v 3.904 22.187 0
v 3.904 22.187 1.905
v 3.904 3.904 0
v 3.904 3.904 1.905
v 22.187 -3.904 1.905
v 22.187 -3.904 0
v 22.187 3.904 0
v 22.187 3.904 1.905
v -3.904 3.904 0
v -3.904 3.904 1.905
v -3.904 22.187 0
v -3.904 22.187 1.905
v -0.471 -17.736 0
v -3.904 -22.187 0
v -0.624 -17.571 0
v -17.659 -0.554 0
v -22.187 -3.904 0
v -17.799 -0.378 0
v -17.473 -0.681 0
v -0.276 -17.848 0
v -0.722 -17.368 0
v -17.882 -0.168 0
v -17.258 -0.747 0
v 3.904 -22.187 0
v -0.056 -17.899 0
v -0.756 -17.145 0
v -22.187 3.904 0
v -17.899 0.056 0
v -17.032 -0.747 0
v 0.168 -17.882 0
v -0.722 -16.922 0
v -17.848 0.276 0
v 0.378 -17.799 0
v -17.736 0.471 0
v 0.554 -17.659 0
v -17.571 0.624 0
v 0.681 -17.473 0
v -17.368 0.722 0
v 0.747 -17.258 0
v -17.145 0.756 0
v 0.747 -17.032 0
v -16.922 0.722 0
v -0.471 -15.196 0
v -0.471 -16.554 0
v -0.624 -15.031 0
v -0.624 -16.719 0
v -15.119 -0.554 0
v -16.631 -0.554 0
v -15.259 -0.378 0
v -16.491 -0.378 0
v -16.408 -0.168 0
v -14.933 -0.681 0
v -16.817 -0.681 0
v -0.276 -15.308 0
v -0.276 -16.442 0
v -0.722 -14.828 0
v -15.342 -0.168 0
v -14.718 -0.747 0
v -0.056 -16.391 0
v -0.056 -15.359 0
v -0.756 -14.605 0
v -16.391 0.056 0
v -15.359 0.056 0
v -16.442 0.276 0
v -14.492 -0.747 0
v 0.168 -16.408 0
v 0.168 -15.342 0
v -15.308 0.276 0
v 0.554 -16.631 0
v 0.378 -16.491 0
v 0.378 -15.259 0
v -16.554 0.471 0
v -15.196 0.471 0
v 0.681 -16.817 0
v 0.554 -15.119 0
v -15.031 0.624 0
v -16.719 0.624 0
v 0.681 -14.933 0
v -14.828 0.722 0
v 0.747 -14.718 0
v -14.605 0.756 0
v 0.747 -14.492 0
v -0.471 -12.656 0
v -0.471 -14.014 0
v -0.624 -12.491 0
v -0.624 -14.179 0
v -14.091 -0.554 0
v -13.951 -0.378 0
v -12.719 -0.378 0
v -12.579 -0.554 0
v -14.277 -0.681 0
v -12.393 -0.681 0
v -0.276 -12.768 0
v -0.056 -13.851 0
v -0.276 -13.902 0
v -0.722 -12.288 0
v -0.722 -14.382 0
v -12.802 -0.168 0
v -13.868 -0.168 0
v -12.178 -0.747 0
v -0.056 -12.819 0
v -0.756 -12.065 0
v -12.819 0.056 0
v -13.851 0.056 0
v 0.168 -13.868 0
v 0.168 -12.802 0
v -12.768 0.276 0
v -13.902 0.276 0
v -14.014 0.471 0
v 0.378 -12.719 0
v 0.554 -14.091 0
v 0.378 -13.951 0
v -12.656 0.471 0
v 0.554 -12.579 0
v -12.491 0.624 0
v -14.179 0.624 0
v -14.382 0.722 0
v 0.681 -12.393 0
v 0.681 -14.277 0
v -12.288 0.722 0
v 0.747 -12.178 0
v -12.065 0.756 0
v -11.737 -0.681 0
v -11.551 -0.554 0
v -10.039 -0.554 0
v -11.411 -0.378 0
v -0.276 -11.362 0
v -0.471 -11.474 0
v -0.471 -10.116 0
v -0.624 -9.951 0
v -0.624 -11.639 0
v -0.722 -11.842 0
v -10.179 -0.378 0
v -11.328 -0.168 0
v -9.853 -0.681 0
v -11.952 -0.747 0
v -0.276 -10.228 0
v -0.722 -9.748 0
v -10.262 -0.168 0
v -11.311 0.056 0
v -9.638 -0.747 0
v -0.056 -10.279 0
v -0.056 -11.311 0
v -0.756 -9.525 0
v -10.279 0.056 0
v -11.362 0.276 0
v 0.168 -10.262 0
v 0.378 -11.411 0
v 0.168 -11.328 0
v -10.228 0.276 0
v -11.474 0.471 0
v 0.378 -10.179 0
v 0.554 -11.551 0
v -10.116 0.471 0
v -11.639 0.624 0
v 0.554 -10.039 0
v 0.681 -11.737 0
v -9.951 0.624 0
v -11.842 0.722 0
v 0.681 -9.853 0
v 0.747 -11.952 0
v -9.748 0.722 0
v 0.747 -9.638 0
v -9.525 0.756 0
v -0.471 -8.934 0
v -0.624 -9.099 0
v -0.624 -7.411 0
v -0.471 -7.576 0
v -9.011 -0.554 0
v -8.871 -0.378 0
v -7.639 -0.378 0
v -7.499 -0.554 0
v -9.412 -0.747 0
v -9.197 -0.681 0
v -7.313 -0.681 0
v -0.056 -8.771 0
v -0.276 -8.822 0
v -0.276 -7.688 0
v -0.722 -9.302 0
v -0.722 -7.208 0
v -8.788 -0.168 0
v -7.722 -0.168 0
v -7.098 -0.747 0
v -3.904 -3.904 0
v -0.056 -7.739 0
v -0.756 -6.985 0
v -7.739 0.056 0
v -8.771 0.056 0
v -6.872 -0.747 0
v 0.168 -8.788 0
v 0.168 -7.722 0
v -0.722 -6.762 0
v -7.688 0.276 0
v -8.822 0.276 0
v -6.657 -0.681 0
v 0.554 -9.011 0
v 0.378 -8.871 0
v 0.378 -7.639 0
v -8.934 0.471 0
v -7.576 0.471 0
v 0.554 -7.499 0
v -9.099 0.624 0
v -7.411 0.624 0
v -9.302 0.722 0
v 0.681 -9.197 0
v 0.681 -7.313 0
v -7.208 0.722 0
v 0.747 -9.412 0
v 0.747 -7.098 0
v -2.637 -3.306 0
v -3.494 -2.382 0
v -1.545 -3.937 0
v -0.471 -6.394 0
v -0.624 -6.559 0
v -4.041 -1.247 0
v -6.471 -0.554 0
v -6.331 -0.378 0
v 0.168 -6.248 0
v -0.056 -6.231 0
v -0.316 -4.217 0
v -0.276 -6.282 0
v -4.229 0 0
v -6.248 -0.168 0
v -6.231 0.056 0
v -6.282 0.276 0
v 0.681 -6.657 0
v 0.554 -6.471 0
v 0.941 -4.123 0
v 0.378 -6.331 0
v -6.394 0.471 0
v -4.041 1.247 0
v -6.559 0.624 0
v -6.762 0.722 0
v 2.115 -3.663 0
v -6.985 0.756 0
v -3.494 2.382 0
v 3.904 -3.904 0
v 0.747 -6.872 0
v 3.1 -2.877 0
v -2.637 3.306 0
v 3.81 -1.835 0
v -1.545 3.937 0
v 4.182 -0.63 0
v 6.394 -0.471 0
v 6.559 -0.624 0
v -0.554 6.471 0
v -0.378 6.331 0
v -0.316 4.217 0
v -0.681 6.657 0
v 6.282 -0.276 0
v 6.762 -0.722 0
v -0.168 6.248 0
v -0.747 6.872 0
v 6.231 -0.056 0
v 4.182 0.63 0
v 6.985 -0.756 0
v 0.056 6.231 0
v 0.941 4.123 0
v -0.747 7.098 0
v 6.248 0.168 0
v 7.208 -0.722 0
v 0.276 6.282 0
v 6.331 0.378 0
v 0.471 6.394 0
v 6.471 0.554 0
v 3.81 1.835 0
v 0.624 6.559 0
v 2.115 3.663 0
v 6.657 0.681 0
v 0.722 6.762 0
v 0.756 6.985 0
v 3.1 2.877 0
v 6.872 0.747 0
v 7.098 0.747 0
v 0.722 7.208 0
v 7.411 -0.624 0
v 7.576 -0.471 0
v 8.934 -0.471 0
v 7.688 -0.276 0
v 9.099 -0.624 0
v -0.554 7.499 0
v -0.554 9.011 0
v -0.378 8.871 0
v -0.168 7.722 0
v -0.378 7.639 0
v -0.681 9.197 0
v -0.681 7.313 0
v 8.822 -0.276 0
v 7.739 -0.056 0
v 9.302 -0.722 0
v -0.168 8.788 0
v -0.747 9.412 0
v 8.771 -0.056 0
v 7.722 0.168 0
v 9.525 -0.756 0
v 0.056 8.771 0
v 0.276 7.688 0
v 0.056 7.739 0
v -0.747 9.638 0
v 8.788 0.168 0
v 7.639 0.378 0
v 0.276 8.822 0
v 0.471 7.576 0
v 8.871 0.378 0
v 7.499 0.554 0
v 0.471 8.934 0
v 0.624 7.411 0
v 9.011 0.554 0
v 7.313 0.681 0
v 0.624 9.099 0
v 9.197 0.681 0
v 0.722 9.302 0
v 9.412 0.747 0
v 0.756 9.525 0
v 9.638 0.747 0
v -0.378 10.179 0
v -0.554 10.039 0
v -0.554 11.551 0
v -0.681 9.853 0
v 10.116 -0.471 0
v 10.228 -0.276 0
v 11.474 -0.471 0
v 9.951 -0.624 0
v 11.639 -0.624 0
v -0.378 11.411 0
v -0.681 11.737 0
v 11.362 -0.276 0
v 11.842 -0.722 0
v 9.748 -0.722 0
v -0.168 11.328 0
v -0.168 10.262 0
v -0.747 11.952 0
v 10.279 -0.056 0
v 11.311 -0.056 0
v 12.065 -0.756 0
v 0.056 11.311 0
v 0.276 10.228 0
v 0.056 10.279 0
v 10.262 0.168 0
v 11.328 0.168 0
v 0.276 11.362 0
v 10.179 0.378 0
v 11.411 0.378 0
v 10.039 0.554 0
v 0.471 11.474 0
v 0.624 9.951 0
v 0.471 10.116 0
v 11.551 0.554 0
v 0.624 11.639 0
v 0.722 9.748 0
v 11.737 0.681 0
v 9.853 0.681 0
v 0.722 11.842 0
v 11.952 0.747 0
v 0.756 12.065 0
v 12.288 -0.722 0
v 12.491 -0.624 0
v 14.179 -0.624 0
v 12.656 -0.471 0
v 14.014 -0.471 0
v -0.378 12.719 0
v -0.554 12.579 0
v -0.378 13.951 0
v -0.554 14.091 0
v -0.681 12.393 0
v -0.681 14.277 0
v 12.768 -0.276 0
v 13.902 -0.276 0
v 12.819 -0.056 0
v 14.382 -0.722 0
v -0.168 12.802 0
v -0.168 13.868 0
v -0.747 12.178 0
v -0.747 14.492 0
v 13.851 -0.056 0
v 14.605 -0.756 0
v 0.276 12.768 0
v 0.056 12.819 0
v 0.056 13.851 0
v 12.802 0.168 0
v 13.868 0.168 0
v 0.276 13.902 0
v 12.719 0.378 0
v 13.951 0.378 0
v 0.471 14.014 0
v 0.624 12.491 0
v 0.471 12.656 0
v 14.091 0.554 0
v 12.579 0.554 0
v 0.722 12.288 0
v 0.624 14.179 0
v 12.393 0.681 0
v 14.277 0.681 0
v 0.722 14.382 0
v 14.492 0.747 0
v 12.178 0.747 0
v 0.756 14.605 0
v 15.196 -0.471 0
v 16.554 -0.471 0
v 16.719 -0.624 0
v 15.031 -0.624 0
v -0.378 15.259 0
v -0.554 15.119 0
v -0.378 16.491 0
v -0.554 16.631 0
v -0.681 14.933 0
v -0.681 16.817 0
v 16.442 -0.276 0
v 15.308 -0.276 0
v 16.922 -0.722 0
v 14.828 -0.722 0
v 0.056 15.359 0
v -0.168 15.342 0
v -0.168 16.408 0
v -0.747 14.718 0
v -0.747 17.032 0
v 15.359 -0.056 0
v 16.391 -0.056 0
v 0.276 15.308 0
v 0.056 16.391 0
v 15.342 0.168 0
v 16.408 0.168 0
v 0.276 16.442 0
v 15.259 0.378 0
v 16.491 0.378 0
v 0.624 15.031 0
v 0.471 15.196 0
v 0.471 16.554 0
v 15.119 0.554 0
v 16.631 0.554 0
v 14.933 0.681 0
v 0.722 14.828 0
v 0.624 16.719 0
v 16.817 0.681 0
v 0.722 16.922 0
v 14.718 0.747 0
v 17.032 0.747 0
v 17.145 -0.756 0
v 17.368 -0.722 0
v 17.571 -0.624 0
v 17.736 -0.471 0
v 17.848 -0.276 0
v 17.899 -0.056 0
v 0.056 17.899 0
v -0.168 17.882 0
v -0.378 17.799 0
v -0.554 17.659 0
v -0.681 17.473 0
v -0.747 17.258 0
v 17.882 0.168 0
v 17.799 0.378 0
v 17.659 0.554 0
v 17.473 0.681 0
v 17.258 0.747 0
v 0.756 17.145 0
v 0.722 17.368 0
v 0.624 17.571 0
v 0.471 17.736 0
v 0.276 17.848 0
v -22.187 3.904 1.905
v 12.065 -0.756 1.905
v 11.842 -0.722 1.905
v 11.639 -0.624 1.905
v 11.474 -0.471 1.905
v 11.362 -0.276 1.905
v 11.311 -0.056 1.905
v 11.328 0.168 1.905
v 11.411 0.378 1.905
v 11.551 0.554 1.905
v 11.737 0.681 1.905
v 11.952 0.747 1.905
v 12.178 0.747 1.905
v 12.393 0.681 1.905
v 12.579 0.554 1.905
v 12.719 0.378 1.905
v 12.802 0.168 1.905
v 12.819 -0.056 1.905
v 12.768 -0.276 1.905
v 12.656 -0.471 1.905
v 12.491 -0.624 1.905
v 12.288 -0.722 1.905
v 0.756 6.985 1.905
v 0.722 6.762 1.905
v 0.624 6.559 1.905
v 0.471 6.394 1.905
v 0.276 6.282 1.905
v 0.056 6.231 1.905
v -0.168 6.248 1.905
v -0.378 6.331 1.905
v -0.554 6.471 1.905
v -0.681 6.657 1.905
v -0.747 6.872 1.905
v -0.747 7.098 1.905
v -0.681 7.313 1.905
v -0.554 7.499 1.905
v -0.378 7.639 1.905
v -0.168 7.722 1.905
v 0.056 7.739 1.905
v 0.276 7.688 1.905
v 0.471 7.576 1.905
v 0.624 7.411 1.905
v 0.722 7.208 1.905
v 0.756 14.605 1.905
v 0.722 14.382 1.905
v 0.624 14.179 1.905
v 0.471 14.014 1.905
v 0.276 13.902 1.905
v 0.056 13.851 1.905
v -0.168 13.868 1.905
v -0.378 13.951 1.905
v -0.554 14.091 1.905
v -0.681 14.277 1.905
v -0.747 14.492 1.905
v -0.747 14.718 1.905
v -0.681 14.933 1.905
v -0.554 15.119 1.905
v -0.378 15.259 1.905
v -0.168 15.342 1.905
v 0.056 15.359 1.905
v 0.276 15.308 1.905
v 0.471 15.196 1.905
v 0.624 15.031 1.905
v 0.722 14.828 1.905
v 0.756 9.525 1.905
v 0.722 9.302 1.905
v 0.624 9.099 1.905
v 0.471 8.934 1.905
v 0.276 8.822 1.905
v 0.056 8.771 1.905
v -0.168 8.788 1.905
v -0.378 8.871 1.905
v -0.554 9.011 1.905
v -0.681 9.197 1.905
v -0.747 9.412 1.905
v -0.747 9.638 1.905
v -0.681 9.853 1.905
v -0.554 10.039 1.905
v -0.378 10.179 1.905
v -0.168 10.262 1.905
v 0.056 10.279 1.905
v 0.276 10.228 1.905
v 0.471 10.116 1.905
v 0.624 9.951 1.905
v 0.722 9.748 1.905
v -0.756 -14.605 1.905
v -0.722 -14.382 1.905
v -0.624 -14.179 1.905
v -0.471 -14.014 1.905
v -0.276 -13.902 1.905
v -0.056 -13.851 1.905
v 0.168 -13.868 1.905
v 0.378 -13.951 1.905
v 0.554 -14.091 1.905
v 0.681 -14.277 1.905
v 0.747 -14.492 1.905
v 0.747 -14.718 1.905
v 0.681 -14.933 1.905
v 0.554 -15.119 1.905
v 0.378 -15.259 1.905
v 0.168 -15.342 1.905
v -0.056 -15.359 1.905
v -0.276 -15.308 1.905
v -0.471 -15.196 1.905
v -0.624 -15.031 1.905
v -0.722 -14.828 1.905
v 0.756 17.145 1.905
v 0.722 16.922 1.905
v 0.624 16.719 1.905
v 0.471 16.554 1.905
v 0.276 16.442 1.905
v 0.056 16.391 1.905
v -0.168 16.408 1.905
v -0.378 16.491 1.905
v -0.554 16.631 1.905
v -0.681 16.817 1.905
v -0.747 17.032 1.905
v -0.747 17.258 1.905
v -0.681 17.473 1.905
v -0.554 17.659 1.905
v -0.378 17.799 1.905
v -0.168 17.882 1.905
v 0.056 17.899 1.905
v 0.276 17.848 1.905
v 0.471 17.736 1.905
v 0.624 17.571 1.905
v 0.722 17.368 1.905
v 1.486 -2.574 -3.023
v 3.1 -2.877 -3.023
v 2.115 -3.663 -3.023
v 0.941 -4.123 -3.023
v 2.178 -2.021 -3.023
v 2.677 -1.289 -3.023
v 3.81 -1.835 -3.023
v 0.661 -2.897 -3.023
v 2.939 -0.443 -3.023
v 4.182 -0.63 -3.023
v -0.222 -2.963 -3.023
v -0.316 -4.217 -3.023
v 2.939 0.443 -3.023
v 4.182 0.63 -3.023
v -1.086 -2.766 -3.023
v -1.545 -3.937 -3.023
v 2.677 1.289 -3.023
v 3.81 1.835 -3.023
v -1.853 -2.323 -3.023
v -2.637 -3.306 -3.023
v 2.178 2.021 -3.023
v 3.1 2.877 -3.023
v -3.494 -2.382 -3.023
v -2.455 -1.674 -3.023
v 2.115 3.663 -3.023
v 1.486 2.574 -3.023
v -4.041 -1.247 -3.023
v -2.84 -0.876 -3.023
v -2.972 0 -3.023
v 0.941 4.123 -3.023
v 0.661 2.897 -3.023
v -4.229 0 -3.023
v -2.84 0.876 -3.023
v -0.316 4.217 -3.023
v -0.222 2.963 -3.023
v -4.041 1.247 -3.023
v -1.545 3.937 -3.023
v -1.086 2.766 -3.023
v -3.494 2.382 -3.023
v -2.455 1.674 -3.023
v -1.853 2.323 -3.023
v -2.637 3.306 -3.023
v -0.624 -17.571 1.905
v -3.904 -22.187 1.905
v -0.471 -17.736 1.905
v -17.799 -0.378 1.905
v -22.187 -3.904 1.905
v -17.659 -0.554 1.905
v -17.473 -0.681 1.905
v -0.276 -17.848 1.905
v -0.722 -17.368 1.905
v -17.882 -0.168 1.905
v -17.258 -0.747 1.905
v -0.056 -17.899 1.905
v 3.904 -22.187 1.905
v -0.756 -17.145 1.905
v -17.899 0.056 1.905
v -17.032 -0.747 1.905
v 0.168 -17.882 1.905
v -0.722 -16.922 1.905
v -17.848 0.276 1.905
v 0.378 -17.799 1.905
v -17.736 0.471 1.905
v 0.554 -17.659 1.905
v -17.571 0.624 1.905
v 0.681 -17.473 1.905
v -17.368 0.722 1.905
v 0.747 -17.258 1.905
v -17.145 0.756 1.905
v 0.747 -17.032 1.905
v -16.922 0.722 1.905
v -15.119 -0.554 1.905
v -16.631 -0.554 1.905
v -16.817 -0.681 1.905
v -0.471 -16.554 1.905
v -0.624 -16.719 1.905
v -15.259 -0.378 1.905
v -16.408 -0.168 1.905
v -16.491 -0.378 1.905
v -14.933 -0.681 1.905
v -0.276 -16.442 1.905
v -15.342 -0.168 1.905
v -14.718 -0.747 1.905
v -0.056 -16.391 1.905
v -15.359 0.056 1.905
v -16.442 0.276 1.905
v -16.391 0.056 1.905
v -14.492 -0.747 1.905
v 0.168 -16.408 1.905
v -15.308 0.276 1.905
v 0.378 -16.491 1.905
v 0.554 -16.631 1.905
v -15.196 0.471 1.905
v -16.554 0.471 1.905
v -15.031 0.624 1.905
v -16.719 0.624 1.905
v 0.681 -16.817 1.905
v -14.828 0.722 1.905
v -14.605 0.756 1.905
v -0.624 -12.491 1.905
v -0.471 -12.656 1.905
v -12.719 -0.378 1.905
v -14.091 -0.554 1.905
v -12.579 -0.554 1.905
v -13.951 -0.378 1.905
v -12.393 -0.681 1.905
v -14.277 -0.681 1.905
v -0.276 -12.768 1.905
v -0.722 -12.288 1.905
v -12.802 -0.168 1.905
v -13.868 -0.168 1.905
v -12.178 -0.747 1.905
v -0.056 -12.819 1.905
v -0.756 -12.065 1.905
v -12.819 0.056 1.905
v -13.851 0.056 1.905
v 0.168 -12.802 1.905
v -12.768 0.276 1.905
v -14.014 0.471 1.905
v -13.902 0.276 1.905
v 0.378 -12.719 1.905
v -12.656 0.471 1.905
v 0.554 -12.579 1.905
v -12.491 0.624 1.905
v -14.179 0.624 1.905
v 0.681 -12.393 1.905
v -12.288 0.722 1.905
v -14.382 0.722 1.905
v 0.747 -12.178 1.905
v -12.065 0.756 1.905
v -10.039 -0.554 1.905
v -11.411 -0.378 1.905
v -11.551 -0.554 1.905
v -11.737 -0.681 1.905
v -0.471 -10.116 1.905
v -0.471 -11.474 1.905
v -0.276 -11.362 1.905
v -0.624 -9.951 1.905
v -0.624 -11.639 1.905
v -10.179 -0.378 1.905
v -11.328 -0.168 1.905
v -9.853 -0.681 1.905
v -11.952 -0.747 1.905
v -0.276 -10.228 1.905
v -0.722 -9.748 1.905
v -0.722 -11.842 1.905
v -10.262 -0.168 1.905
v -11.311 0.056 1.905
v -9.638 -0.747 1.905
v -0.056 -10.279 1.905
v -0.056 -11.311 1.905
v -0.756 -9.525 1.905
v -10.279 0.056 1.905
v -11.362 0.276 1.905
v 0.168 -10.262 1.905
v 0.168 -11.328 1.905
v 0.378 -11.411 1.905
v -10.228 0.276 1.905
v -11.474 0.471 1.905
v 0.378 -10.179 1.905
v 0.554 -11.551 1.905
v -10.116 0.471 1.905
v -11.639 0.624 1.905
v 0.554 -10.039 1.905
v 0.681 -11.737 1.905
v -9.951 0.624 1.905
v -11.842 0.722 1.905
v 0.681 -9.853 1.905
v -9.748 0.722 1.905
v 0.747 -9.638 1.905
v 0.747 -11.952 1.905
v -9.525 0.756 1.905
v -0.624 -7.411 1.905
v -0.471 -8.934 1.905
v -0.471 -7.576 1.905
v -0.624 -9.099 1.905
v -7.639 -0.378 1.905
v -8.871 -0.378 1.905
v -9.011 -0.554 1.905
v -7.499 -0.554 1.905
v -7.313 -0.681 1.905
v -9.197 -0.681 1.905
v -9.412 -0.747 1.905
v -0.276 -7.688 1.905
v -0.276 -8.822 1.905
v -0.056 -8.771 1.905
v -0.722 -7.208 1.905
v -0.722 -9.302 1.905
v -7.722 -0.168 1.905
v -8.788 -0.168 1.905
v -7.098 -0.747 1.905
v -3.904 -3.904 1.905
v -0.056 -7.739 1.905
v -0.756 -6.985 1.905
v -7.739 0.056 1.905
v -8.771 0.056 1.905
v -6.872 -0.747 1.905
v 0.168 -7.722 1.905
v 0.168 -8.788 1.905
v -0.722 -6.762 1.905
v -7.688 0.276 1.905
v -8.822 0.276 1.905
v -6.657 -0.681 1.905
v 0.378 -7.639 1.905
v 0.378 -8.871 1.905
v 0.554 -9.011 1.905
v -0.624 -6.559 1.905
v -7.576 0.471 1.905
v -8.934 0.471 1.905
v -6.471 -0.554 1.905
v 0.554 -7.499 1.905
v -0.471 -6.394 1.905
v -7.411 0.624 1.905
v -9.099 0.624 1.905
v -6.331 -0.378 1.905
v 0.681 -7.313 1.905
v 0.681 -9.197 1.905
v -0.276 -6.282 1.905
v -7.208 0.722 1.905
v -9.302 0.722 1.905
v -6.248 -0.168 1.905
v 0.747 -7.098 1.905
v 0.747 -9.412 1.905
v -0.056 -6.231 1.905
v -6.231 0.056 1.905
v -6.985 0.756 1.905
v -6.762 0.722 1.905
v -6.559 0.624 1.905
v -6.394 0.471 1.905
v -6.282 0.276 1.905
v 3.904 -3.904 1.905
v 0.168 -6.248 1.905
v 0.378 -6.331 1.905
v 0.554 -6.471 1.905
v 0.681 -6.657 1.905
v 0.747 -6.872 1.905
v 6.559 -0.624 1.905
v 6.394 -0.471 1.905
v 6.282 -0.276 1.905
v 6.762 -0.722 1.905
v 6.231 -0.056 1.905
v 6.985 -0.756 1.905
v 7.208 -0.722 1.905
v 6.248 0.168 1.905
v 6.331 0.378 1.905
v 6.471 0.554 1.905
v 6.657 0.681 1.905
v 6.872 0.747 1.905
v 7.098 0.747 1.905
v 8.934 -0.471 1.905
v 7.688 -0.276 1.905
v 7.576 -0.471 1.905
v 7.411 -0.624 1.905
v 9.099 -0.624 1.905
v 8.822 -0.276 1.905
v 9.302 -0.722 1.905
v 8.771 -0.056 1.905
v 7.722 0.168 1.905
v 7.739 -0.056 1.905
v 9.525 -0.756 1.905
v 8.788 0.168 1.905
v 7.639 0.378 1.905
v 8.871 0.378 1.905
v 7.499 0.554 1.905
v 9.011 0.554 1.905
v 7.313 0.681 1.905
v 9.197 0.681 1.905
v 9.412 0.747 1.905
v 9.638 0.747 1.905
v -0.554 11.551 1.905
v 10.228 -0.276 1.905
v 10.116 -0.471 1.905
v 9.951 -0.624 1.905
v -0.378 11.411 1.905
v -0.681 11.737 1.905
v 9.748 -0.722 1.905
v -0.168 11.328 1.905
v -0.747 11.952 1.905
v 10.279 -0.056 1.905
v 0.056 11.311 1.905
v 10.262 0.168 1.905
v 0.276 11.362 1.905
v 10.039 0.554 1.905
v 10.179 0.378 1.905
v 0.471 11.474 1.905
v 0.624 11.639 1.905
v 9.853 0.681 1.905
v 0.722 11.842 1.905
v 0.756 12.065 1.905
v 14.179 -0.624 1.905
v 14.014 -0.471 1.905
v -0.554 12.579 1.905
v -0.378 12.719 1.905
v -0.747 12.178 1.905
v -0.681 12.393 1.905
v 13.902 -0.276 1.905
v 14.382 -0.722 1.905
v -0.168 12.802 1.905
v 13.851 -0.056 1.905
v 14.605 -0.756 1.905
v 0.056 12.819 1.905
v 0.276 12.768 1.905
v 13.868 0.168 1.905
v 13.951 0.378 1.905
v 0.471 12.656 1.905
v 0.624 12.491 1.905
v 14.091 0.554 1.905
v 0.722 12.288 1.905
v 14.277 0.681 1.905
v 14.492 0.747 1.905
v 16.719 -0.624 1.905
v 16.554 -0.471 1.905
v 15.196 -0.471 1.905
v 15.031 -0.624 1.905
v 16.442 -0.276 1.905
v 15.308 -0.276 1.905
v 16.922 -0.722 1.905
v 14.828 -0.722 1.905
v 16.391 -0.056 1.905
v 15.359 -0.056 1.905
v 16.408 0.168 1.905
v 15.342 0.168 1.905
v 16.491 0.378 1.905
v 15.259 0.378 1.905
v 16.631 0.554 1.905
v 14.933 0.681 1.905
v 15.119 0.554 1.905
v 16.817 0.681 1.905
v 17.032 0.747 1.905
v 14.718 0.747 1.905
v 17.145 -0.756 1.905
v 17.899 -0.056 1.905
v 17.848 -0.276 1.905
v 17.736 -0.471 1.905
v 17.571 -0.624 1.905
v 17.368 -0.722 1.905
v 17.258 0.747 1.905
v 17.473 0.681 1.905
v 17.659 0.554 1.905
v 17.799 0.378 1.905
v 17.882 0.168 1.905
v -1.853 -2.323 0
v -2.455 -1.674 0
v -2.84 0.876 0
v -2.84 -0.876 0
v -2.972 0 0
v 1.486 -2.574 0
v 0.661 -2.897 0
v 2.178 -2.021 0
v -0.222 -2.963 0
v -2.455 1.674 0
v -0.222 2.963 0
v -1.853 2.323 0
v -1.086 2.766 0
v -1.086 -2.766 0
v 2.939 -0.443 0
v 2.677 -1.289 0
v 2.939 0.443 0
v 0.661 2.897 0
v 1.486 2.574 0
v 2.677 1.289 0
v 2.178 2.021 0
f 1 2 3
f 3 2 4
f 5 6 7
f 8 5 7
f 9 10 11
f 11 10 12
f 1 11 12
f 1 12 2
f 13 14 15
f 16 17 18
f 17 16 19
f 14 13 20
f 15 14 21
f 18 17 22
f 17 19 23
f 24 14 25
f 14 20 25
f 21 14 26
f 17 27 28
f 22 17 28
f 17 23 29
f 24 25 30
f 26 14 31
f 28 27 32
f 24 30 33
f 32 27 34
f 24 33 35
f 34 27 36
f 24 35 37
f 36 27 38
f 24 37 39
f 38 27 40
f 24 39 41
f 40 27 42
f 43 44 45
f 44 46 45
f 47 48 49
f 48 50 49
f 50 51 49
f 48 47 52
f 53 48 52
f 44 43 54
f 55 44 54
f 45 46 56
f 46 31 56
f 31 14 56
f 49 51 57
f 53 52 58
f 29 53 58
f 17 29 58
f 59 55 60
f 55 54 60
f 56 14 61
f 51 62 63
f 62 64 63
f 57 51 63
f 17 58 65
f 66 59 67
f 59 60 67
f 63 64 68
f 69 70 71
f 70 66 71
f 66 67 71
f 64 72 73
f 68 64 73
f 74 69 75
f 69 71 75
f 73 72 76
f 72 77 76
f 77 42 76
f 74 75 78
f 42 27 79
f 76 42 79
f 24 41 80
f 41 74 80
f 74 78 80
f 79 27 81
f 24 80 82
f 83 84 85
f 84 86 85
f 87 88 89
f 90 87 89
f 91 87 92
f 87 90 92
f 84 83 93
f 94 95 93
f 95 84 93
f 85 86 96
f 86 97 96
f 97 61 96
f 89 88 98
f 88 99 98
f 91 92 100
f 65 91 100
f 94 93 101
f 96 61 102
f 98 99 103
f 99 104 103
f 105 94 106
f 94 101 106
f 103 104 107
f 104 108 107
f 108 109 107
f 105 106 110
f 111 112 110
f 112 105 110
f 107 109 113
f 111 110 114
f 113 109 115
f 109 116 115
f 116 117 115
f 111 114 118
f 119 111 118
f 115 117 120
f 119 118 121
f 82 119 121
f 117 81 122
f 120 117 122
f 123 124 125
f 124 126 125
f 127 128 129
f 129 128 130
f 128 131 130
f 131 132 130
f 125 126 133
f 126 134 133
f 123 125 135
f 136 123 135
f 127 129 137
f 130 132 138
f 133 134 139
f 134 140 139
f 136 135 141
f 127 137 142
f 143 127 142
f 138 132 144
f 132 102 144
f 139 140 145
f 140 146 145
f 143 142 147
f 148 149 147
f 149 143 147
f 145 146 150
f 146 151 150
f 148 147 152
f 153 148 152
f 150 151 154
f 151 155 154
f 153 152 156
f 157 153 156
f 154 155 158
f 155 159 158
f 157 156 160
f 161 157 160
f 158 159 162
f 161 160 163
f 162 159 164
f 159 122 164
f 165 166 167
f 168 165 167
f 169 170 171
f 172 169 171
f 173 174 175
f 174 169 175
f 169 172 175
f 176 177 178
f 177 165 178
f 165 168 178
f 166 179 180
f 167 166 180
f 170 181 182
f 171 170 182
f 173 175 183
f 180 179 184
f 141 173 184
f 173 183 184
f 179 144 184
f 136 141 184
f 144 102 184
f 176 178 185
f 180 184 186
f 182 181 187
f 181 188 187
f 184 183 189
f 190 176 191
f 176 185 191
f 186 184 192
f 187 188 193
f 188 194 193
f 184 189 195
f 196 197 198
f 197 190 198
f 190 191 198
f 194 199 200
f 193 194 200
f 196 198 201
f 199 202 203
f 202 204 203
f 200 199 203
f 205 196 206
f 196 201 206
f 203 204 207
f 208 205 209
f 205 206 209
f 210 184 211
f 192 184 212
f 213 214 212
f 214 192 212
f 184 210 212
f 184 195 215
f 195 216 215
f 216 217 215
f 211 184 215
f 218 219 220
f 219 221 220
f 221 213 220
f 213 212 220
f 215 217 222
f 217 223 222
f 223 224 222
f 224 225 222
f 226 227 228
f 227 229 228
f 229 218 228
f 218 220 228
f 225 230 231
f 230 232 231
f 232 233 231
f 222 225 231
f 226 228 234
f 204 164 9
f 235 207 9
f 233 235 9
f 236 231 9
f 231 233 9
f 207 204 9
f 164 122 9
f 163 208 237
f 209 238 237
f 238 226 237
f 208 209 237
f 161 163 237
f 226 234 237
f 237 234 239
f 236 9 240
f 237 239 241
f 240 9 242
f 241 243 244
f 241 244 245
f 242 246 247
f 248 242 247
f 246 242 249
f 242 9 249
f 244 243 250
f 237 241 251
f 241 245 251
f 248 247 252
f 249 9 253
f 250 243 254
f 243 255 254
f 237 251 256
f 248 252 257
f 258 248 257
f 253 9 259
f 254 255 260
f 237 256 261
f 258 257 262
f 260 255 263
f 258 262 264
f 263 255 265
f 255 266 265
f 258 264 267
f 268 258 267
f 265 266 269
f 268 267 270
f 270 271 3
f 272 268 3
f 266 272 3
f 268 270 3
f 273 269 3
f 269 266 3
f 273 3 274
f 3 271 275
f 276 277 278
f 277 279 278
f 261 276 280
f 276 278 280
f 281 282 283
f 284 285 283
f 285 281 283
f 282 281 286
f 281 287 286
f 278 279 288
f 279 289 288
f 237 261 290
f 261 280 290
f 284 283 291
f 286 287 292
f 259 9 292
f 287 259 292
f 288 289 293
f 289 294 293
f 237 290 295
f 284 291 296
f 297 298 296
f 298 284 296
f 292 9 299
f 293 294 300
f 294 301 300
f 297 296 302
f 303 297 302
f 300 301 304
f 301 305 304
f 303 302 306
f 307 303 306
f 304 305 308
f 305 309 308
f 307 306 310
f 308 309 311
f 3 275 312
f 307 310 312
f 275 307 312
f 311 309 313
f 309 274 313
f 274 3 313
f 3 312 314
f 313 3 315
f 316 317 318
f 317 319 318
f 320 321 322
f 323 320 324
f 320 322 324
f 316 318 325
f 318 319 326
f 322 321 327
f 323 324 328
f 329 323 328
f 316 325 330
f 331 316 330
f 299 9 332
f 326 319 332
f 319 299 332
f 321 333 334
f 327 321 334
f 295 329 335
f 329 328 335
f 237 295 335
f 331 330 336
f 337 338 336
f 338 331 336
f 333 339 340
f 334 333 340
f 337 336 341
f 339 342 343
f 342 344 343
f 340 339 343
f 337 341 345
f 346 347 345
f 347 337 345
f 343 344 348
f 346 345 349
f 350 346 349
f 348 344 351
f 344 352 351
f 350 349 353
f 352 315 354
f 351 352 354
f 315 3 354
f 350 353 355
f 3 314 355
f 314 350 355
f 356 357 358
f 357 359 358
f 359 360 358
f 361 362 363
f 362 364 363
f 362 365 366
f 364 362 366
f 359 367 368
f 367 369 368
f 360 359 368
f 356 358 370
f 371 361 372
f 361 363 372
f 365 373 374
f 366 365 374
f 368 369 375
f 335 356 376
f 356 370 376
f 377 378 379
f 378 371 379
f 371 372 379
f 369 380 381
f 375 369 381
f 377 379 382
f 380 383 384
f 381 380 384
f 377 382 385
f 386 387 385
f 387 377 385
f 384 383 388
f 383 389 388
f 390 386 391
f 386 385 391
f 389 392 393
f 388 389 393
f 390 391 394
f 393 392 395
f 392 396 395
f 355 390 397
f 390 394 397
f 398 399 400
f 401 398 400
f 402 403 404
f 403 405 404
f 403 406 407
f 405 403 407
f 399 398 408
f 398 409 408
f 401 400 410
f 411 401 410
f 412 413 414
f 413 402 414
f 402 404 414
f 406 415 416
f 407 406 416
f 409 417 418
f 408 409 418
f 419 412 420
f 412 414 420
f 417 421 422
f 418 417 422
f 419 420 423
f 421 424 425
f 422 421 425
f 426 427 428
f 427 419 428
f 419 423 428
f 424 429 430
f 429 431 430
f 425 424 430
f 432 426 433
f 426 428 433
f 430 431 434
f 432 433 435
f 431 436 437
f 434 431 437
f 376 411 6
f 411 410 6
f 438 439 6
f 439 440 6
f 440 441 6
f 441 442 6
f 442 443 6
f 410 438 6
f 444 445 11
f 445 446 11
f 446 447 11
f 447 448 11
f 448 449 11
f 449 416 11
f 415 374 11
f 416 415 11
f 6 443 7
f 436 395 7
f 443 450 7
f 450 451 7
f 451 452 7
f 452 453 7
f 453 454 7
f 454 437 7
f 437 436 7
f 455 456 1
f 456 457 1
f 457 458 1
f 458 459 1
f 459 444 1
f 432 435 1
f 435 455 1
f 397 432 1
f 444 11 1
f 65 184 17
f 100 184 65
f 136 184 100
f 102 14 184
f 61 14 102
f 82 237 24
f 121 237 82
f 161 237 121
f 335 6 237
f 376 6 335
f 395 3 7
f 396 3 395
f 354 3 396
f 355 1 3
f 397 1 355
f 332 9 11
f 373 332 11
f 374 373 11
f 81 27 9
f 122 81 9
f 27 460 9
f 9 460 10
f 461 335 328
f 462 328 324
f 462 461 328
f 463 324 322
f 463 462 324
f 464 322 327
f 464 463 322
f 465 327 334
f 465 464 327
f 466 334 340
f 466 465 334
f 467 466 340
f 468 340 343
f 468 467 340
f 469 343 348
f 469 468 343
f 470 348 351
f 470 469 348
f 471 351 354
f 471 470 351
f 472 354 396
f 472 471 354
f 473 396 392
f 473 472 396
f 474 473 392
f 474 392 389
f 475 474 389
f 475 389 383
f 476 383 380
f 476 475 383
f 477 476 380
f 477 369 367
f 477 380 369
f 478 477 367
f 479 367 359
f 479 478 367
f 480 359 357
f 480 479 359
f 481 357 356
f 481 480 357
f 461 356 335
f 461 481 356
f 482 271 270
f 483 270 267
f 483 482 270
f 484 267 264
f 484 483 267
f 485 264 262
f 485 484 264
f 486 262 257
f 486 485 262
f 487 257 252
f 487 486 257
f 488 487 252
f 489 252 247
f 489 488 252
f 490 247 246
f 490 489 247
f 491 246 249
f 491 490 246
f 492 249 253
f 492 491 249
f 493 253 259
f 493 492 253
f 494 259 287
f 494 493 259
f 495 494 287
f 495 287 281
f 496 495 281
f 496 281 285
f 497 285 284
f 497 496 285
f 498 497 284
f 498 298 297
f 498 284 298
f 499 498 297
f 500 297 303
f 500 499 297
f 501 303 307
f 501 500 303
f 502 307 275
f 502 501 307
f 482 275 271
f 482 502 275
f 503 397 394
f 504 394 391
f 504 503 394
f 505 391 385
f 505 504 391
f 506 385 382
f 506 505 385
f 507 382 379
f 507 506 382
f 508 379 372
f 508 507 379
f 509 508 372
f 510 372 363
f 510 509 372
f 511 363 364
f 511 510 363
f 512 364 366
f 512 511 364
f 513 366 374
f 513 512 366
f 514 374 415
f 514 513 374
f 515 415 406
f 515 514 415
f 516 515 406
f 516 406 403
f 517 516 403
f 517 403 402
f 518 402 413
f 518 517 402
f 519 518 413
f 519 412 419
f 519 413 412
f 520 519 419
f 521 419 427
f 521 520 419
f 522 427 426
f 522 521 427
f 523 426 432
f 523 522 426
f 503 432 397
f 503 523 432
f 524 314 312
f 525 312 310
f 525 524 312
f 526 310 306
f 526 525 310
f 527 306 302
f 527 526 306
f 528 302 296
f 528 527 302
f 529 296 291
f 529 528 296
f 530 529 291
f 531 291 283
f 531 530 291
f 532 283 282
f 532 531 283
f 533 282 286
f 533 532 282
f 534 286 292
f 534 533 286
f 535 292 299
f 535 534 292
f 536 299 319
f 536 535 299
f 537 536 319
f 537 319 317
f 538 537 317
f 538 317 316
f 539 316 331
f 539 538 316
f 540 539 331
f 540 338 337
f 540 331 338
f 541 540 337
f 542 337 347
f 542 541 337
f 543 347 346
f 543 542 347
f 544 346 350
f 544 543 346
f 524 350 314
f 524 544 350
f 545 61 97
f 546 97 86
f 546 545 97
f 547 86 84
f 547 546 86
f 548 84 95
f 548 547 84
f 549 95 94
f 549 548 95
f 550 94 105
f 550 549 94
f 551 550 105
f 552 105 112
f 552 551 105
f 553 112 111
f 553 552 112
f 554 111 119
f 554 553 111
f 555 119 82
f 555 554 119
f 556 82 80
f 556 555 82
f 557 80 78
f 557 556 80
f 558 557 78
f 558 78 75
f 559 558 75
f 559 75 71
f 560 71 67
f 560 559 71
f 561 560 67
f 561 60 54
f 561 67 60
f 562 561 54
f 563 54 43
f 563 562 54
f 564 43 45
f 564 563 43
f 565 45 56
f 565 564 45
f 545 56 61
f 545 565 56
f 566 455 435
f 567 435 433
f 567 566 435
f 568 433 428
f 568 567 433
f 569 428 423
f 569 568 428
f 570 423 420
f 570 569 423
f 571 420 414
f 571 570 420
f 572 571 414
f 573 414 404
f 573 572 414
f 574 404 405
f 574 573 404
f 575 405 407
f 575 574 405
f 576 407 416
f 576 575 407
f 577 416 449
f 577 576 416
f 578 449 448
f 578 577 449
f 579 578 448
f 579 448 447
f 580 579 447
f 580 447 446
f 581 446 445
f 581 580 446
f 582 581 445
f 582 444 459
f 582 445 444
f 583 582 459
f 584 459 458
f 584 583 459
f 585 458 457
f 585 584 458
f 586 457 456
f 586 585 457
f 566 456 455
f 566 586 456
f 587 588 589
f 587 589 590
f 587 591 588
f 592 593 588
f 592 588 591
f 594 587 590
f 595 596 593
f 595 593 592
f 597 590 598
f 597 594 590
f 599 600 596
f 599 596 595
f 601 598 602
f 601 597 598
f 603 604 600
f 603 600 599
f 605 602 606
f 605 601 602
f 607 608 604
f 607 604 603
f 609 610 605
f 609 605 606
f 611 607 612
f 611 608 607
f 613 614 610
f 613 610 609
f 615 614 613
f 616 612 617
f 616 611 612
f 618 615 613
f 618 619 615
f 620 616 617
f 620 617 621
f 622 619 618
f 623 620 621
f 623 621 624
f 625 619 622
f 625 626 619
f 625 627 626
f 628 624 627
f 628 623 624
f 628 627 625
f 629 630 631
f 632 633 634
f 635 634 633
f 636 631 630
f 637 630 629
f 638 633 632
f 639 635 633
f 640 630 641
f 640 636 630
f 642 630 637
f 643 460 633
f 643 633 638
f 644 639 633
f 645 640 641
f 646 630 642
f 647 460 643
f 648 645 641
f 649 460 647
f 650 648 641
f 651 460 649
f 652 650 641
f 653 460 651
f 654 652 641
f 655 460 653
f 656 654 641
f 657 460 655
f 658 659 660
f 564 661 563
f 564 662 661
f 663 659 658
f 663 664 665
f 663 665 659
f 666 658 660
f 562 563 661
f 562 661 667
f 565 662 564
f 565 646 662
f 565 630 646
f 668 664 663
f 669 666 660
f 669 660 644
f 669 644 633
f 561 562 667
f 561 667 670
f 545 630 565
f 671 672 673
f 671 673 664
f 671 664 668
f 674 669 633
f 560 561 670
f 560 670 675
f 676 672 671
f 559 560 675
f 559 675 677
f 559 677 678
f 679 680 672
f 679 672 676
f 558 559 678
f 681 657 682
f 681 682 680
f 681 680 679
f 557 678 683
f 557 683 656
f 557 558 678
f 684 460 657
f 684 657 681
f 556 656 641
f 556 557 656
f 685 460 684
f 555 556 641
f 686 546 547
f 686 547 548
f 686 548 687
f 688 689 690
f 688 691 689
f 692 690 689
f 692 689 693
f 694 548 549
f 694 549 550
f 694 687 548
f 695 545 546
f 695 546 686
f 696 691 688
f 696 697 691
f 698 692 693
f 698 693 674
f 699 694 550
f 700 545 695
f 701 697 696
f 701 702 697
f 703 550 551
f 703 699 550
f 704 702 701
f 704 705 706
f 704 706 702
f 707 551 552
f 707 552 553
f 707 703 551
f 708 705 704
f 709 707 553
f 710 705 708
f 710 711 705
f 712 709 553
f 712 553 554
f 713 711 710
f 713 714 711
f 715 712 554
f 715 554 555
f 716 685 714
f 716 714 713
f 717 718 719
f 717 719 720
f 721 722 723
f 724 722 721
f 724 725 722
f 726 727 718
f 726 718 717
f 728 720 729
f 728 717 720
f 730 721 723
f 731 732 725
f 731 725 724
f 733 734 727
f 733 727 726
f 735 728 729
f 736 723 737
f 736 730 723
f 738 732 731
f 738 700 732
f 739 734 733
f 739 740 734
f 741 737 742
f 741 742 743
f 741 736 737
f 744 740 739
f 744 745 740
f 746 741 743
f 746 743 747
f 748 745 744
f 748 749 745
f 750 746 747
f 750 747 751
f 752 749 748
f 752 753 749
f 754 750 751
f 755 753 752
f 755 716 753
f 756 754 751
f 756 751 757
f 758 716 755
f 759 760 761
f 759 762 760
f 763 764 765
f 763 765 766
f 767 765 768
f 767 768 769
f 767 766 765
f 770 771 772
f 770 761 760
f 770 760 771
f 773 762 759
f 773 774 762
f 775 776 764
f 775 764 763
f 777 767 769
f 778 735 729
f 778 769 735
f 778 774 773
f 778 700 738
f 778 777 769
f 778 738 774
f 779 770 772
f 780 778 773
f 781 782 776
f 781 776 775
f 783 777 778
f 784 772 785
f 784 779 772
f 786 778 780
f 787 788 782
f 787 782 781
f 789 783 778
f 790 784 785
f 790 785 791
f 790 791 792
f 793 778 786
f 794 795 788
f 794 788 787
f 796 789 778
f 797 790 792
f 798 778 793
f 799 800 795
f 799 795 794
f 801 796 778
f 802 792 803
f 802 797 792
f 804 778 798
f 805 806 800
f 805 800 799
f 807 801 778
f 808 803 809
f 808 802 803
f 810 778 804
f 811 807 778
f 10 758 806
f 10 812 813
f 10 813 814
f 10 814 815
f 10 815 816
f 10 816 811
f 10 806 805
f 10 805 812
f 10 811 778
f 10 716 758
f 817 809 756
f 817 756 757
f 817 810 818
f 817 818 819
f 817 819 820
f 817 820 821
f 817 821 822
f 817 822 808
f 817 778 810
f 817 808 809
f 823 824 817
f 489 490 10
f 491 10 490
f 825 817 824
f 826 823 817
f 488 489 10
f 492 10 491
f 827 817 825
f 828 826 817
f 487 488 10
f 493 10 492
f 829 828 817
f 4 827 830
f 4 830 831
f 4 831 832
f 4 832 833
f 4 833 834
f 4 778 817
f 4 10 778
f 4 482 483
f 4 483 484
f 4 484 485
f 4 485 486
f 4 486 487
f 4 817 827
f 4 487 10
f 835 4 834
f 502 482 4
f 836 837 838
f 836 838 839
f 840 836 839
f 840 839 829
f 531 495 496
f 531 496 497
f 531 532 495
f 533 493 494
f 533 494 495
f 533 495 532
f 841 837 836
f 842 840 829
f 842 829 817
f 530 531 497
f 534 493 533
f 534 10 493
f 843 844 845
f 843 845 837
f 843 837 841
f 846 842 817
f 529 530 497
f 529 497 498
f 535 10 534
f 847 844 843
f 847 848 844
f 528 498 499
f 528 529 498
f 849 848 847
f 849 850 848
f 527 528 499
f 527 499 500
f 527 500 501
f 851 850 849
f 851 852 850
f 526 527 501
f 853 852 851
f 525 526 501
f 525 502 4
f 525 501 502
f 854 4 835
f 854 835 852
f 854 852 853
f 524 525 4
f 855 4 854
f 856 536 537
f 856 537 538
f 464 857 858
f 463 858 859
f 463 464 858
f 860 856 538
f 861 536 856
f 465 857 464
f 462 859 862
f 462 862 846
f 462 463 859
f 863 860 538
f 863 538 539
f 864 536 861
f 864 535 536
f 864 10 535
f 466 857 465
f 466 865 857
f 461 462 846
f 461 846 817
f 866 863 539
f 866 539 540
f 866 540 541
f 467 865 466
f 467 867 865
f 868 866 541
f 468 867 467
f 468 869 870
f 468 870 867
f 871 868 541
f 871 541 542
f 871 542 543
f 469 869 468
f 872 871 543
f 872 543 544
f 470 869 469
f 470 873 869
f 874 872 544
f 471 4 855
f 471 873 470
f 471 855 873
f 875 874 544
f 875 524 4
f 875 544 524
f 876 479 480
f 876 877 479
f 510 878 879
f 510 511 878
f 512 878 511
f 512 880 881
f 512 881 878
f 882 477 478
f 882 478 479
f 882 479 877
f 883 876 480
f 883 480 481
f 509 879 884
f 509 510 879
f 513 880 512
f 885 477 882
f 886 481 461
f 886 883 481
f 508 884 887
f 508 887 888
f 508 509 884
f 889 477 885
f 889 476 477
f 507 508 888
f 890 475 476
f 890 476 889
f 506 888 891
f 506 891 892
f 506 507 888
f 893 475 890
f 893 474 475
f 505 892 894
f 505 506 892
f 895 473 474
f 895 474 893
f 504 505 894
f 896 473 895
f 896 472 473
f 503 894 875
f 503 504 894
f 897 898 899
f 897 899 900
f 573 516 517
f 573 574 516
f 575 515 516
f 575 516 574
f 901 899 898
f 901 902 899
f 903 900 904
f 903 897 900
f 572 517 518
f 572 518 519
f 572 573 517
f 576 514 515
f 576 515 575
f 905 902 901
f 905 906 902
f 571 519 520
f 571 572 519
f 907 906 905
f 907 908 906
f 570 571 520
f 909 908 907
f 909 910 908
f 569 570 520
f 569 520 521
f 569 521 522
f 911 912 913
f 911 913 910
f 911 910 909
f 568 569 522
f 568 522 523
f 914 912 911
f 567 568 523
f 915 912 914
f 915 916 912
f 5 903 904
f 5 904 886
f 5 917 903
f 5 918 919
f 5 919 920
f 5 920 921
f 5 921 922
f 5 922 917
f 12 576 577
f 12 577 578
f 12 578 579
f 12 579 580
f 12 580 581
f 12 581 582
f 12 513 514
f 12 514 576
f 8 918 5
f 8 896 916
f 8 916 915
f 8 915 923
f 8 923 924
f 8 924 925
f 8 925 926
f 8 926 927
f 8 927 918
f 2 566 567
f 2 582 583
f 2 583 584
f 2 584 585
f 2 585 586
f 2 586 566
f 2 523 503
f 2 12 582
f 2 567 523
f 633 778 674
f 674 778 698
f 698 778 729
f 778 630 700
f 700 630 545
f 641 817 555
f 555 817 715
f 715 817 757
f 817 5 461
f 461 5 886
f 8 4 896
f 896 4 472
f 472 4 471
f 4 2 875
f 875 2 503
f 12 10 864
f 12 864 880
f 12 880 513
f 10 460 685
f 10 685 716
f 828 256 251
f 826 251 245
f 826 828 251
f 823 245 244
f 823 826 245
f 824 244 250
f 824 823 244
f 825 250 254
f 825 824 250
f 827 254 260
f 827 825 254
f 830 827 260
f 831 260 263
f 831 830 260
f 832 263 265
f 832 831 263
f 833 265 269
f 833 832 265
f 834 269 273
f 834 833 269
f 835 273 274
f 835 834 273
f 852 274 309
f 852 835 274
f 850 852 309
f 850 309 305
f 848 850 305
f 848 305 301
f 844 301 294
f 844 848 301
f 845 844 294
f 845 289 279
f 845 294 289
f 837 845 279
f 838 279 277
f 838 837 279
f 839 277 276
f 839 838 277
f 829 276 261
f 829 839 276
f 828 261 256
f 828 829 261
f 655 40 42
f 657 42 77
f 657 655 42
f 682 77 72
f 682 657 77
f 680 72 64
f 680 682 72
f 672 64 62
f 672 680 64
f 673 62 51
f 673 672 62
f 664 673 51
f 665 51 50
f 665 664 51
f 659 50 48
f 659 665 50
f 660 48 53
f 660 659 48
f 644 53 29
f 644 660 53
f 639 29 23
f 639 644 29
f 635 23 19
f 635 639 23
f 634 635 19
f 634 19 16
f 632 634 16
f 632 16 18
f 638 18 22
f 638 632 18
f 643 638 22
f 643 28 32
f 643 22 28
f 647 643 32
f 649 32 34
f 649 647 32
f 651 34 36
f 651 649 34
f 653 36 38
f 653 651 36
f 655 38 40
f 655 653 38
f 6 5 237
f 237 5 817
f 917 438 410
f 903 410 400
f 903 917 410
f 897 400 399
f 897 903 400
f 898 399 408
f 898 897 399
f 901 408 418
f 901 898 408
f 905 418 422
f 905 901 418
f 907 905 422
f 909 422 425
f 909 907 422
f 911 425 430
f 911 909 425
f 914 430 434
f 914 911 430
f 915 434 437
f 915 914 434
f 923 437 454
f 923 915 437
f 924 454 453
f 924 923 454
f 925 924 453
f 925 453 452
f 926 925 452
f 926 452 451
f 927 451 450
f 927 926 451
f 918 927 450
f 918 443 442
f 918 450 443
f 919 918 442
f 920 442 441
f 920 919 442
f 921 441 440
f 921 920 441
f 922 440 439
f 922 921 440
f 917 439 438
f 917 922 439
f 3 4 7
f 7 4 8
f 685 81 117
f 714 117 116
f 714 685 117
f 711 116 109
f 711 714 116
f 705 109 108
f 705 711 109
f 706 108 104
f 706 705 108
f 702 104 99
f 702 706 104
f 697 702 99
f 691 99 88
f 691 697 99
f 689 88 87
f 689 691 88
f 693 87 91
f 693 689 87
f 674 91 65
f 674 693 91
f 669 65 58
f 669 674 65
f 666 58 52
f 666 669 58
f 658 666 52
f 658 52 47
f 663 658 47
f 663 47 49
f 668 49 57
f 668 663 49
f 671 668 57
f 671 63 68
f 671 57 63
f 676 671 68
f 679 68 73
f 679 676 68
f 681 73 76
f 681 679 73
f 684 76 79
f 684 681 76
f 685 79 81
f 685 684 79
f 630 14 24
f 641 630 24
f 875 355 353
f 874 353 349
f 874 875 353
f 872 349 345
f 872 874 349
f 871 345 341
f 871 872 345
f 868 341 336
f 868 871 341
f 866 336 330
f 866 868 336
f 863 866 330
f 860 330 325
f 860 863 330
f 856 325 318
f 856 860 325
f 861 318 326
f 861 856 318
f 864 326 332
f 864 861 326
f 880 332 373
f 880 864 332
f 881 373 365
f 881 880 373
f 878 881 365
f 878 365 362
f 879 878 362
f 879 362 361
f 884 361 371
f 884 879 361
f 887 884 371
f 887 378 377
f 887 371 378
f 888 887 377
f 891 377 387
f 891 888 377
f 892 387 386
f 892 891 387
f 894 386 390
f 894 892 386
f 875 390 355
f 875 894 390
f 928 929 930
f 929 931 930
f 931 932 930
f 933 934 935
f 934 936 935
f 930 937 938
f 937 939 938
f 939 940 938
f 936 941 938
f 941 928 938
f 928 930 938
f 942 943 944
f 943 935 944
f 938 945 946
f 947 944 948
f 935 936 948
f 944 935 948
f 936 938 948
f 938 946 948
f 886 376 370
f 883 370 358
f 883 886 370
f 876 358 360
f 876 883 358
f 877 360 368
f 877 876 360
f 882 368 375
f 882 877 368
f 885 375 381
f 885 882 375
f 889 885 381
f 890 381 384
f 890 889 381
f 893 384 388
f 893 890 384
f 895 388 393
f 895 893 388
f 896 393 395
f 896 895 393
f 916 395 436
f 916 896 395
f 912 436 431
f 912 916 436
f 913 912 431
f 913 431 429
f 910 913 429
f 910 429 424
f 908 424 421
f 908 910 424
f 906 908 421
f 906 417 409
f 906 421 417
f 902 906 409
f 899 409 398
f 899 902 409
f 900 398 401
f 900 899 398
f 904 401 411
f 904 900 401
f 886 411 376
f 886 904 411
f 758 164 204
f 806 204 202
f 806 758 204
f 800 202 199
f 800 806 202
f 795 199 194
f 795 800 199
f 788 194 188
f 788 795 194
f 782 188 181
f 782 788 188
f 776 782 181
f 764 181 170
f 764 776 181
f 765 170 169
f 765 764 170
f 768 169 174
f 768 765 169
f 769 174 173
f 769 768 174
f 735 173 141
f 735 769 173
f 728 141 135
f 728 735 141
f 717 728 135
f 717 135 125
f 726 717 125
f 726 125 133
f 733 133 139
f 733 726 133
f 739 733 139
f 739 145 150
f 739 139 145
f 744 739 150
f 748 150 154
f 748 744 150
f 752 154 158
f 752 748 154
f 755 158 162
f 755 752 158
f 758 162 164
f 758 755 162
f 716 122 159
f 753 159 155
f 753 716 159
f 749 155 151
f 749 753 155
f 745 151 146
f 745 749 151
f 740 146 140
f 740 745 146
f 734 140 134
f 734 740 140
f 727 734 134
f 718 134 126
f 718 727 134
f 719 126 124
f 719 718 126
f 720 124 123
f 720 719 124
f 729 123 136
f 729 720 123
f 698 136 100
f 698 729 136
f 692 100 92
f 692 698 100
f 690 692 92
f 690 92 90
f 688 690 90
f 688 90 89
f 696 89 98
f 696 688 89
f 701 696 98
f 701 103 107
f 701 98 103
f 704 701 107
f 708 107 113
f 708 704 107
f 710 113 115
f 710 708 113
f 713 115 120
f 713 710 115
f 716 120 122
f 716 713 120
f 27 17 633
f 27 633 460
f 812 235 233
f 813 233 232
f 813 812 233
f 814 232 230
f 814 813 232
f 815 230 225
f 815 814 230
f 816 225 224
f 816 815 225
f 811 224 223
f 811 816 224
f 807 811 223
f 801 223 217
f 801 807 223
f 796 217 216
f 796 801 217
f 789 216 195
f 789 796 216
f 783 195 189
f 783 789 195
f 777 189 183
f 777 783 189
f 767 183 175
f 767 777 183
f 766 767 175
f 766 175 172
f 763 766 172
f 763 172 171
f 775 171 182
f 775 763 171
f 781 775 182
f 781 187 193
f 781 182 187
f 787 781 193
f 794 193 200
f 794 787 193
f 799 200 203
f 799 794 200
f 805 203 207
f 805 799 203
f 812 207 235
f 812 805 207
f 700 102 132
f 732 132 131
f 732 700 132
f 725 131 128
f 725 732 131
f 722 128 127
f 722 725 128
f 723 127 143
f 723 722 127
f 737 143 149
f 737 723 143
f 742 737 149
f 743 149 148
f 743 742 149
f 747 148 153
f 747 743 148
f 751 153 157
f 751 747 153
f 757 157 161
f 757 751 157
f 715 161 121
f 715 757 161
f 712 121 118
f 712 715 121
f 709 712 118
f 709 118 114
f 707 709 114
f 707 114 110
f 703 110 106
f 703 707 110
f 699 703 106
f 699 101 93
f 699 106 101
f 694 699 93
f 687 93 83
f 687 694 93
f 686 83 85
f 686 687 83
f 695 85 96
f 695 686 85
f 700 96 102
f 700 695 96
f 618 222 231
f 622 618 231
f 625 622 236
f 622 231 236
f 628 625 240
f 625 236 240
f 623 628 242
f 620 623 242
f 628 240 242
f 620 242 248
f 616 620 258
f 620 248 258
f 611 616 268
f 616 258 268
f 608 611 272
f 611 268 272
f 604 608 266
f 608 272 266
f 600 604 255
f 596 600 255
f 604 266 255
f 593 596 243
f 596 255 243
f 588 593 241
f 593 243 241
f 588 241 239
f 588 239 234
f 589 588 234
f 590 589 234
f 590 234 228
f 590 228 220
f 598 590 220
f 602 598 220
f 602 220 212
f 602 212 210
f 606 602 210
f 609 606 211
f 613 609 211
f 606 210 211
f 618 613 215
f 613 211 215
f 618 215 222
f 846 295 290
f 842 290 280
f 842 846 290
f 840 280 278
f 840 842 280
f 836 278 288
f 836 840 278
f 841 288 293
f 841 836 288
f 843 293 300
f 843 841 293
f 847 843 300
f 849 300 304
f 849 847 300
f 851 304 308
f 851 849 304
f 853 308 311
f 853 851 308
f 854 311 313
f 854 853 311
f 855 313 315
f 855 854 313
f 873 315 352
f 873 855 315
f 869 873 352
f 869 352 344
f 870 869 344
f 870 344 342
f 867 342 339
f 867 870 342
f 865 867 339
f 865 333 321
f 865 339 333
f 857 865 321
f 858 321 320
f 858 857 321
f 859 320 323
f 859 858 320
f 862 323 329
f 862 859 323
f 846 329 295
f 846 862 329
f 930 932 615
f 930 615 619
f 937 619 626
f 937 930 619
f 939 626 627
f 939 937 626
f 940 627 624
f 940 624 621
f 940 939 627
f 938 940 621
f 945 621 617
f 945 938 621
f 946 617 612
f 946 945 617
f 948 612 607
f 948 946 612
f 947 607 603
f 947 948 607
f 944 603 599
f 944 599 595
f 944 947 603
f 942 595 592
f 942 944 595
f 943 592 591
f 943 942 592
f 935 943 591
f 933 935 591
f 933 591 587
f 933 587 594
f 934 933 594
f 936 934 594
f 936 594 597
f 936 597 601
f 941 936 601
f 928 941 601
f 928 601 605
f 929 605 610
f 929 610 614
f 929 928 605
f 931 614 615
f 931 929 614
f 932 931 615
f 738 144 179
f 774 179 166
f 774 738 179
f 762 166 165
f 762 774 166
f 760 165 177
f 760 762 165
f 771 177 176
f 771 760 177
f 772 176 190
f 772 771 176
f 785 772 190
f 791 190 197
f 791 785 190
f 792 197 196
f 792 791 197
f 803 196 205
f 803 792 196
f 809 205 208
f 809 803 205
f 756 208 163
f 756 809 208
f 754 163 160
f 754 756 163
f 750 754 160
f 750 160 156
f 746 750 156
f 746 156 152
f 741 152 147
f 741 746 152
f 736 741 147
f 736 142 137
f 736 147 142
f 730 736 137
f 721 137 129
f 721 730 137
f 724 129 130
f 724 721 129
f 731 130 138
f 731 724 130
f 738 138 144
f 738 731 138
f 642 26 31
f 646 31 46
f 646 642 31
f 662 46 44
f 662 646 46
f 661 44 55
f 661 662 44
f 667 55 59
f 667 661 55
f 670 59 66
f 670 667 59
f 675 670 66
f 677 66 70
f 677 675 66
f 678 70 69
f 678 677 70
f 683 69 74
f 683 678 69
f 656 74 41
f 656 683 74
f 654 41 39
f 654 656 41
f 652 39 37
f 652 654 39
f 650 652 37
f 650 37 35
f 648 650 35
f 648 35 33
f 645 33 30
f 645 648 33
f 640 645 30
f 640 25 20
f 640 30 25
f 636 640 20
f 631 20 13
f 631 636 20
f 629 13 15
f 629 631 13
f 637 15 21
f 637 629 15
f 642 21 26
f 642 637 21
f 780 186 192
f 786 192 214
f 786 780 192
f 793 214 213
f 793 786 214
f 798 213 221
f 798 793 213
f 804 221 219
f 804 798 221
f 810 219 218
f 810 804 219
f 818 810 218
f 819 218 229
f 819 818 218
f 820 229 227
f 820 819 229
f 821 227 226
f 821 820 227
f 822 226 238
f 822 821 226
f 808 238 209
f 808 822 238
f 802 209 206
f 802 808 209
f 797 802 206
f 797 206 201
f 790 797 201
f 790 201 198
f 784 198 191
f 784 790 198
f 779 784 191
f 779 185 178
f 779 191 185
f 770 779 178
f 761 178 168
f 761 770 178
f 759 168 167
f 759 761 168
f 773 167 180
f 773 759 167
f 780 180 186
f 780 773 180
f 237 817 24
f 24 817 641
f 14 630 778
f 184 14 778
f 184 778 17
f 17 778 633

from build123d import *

# Parameters (mm, degrees)
SKETCH1_W         = 44.3738
SKETCH1_H         = 44.3738
EXTRUDE1_DEPTH    = 1.905
SKETCH2_R         = 4.2291
SKETCH2_R_2       = 2.9718
EXTRUDE2_DEPTH    = 3.0226
LPATTERN2_COUNT   = 5
LPATTERN2_PITCH   = 2.54
CIRPATTERN2_COUNT = 4
SKETCH6_W         = 18.282489336
SKETCH6_H         = 18.282489336
EXTRUDE3_DEPTH    = 5.9276
CIRPATTERN3_COUNT = 4


with BuildPart() as part:
    # Sketch1 → Extrude1 (new body)
    with BuildSketch(Plane.XY):
        Rectangle(SKETCH1_W, SKETCH1_H)
    extrude(amount=EXTRUDE1_DEPTH)

    # Sketch2 → Extrude2 (add)
    with BuildSketch(Plane(origin=(0, 0, 0), x_dir=(-1, 0, 0), z_dir=(0, 0, -1))):
        Circle(SKETCH2_R)
        Circle(SKETCH2_R_2, mode=Mode.SUBTRACT)
    extrude(amount=EXTRUDE2_DEPTH)

    # Sketch4 → #53 (0.0595) Diameter Hole1 (revolve, cut)
    with BuildSketch(Plane(origin=(6.985, 0, 1.905), x_dir=(0, -1, 0), z_dir=(1, 0, 0))):
        Polygon((0, 0), (0, 5.534040327), (0.75565, 5.08), (0.75565, 0), align=None)
    f_53_0_0595_diameter_hole1 = revolve(axis=Axis((6.985, 0, 8.255), (0, 0, -1)), mode=Mode.SUBTRACT)

    # LPattern2: #53 (0.0595) Diameter Hole1 ×5
    with Locations(*[(i * LPATTERN2_PITCH, 0, 0) for i in range(1, LPATTERN2_COUNT)]):
        add(f_53_0_0595_diameter_hole1, mode=Mode.SUBTRACT)

    # CirPattern2: #53 (0.0595) Diameter Hole1 ×4 about axis
    cirpattern2_axis = Axis((0, 0, 0), (0, 0, 1))
    for i in range(1, CIRPATTERN2_COUNT):
        add(f_53_0_0595_diameter_hole1.rotate(cirpattern2_axis, i * 360 / CIRPATTERN2_COUNT), mode=Mode.SUBTRACT)

    # CirPattern2 copy 1 sketch → CirPattern2 copy 1 (revolve, cut)
    with BuildSketch(Plane(origin=(0, 9.525, 1.905), x_dir=(1, 0, 0), z_dir=(0, 1, 0))):
        Polygon((0, 0), (0, 5.534040327), (0.75565, 5.08), (0.75565, 0), align=None)
    revolve(axis=Axis((0, 9.525, 8.255), (0, 0, -1)), mode=Mode.SUBTRACT)

    # CirPattern2 copy 2 sketch → CirPattern2 copy 2 (revolve, cut)
    with BuildSketch(Plane(origin=(-9.525, 0, 1.905), x_dir=(0, 1, 0), z_dir=(-1, 0, 0))):
        Polygon((0, 0), (0, 5.534040327), (0.75565, 5.08), (0.75565, 0), align=None)
    revolve(axis=Axis((-9.525, 0, 8.255), (0, 0, -1)), mode=Mode.SUBTRACT)

    # CirPattern2 copy 3 sketch → CirPattern2 copy 3 (revolve, cut)
    with BuildSketch(Plane(origin=(0, -9.525, 1.905), x_dir=(-1, 0, 0), z_dir=(0, -1, 0))):
        Polygon((0, 0), (0, 5.534040327), (0.75565, 5.08), (0.75565, 0), align=None)
    revolve(axis=Axis((0, -9.525, 8.255), (0, 0, -1)), mode=Mode.SUBTRACT)

    # CirPattern2 copy 4 sketch → CirPattern2 copy 4 (revolve, cut)
    with BuildSketch(Plane(origin=(0, 12.065, 1.905), x_dir=(1, 0, 0), z_dir=(0, 1, 0))):
        Polygon((0, 0), (0, 5.534040327), (0.75565, 5.08), (0.75565, 0), align=None)
    revolve(axis=Axis((0, 12.065, 8.255), (0, 0, -1)), mode=Mode.SUBTRACT)

    # CirPattern2 copy 5 sketch → CirPattern2 copy 5 (revolve, cut)
    with BuildSketch(Plane(origin=(-12.065, 0, 1.905), x_dir=(0, 1, 0), z_dir=(-1, 0, 0))):
        Polygon((0, 0), (0, 5.534040327), (0.75565, 5.08), (0.75565, 0), align=None)
    revolve(axis=Axis((-12.065, 0, 8.255), (0, 0, -1)), mode=Mode.SUBTRACT)

    # CirPattern2 copy 6 sketch → CirPattern2 copy 6 (revolve, cut)
    with BuildSketch(Plane(origin=(0, -12.065, 1.905), x_dir=(-1, 0, 0), z_dir=(0, -1, 0))):
        Polygon((0, 0), (0, 5.534040327), (0.75565, 5.08), (0.75565, 0), align=None)
    revolve(axis=Axis((0, -12.065, 8.255), (0, 0, -1)), mode=Mode.SUBTRACT)

    # CirPattern2 copy 7 sketch → CirPattern2 copy 7 (revolve, cut)
    with BuildSketch(Plane(origin=(0, 14.605, 1.905), x_dir=(1, 0, 0), z_dir=(0, 1, 0))):
        Polygon((0, 0), (0, 5.534040327), (0.75565, 5.08), (0.75565, 0), align=None)
    revolve(axis=Axis((0, 14.605, 8.255), (0, 0, -1)), mode=Mode.SUBTRACT)

    # CirPattern2 copy 8 sketch → CirPattern2 copy 8 (revolve, cut)
    with BuildSketch(Plane(origin=(-14.605, 0, 1.905), x_dir=(0, 1, 0), z_dir=(-1, 0, 0))):
        Polygon((0, 0), (0, 5.534040327), (0.75565, 5.08), (0.75565, 0), align=None)
    revolve(axis=Axis((-14.605, 0, 8.255), (0, 0, -1)), mode=Mode.SUBTRACT)

    # CirPattern2 copy 9 sketch → CirPattern2 copy 9 (revolve, cut)
    with BuildSketch(Plane(origin=(0, -14.605, 1.905), x_dir=(-1, 0, 0), z_dir=(0, -1, 0))):
        Polygon((0, 0), (0, 5.534040327), (0.75565, 5.08), (0.75565, 0), align=None)
    revolve(axis=Axis((0, -14.605, 8.255), (0, 0, -1)), mode=Mode.SUBTRACT)

    # CirPattern2 copy 10 sketch → CirPattern2 copy 10 (revolve, cut)
    with BuildSketch(Plane(origin=(0, 17.145, 1.905), x_dir=(1, 0, 0), z_dir=(0, 1, 0))):
        Polygon((0, 0), (0, 5.534040327), (0.75565, 5.08), (0.75565, 0), align=None)
    revolve(axis=Axis((0, 17.145, 8.255), (0, 0, -1)), mode=Mode.SUBTRACT)

    # CirPattern2 copy 11 sketch → CirPattern2 copy 11 (revolve, cut)
    with BuildSketch(Plane(origin=(-17.145, 0, 1.905), x_dir=(0, 1, 0), z_dir=(-1, 0, 0))):
        Polygon((0, 0), (0, 5.534040327), (0.75565, 5.08), (0.75565, 0), align=None)
    revolve(axis=Axis((-17.145, 0, 8.255), (0, 0, -1)), mode=Mode.SUBTRACT)

    # CirPattern2 copy 12 sketch → CirPattern2 copy 12 (revolve, cut)
    with BuildSketch(Plane(origin=(0, -17.145, 1.905), x_dir=(-1, 0, 0), z_dir=(0, -1, 0))):
        Polygon((0, 0), (0, 5.534040327), (0.75565, 5.08), (0.75565, 0), align=None)
    revolve(axis=Axis((0, -17.145, 8.255), (0, 0, -1)), mode=Mode.SUBTRACT)

    # Sketch6 → Extrude3 (cut, through all)
    with BuildSketch(Plane.XY.offset(1.905)):
        with Locations((-13.045655332, 13.045655332)):
            Rectangle(SKETCH6_W, SKETCH6_H)
    extrude3 = extrude(amount=-EXTRUDE3_DEPTH, mode=Mode.SUBTRACT)

    # CirPattern3: Extrude3 ×4 about axis
    cirpattern3_axis = Axis((0, 0, 0), (0, 0, 1))
    for i in range(1, CIRPATTERN3_COUNT):
        add(extrude3.rotate(cirpattern3_axis, i * 360 / CIRPATTERN3_COUNT), mode=Mode.SUBTRACT)


solid = part.part
